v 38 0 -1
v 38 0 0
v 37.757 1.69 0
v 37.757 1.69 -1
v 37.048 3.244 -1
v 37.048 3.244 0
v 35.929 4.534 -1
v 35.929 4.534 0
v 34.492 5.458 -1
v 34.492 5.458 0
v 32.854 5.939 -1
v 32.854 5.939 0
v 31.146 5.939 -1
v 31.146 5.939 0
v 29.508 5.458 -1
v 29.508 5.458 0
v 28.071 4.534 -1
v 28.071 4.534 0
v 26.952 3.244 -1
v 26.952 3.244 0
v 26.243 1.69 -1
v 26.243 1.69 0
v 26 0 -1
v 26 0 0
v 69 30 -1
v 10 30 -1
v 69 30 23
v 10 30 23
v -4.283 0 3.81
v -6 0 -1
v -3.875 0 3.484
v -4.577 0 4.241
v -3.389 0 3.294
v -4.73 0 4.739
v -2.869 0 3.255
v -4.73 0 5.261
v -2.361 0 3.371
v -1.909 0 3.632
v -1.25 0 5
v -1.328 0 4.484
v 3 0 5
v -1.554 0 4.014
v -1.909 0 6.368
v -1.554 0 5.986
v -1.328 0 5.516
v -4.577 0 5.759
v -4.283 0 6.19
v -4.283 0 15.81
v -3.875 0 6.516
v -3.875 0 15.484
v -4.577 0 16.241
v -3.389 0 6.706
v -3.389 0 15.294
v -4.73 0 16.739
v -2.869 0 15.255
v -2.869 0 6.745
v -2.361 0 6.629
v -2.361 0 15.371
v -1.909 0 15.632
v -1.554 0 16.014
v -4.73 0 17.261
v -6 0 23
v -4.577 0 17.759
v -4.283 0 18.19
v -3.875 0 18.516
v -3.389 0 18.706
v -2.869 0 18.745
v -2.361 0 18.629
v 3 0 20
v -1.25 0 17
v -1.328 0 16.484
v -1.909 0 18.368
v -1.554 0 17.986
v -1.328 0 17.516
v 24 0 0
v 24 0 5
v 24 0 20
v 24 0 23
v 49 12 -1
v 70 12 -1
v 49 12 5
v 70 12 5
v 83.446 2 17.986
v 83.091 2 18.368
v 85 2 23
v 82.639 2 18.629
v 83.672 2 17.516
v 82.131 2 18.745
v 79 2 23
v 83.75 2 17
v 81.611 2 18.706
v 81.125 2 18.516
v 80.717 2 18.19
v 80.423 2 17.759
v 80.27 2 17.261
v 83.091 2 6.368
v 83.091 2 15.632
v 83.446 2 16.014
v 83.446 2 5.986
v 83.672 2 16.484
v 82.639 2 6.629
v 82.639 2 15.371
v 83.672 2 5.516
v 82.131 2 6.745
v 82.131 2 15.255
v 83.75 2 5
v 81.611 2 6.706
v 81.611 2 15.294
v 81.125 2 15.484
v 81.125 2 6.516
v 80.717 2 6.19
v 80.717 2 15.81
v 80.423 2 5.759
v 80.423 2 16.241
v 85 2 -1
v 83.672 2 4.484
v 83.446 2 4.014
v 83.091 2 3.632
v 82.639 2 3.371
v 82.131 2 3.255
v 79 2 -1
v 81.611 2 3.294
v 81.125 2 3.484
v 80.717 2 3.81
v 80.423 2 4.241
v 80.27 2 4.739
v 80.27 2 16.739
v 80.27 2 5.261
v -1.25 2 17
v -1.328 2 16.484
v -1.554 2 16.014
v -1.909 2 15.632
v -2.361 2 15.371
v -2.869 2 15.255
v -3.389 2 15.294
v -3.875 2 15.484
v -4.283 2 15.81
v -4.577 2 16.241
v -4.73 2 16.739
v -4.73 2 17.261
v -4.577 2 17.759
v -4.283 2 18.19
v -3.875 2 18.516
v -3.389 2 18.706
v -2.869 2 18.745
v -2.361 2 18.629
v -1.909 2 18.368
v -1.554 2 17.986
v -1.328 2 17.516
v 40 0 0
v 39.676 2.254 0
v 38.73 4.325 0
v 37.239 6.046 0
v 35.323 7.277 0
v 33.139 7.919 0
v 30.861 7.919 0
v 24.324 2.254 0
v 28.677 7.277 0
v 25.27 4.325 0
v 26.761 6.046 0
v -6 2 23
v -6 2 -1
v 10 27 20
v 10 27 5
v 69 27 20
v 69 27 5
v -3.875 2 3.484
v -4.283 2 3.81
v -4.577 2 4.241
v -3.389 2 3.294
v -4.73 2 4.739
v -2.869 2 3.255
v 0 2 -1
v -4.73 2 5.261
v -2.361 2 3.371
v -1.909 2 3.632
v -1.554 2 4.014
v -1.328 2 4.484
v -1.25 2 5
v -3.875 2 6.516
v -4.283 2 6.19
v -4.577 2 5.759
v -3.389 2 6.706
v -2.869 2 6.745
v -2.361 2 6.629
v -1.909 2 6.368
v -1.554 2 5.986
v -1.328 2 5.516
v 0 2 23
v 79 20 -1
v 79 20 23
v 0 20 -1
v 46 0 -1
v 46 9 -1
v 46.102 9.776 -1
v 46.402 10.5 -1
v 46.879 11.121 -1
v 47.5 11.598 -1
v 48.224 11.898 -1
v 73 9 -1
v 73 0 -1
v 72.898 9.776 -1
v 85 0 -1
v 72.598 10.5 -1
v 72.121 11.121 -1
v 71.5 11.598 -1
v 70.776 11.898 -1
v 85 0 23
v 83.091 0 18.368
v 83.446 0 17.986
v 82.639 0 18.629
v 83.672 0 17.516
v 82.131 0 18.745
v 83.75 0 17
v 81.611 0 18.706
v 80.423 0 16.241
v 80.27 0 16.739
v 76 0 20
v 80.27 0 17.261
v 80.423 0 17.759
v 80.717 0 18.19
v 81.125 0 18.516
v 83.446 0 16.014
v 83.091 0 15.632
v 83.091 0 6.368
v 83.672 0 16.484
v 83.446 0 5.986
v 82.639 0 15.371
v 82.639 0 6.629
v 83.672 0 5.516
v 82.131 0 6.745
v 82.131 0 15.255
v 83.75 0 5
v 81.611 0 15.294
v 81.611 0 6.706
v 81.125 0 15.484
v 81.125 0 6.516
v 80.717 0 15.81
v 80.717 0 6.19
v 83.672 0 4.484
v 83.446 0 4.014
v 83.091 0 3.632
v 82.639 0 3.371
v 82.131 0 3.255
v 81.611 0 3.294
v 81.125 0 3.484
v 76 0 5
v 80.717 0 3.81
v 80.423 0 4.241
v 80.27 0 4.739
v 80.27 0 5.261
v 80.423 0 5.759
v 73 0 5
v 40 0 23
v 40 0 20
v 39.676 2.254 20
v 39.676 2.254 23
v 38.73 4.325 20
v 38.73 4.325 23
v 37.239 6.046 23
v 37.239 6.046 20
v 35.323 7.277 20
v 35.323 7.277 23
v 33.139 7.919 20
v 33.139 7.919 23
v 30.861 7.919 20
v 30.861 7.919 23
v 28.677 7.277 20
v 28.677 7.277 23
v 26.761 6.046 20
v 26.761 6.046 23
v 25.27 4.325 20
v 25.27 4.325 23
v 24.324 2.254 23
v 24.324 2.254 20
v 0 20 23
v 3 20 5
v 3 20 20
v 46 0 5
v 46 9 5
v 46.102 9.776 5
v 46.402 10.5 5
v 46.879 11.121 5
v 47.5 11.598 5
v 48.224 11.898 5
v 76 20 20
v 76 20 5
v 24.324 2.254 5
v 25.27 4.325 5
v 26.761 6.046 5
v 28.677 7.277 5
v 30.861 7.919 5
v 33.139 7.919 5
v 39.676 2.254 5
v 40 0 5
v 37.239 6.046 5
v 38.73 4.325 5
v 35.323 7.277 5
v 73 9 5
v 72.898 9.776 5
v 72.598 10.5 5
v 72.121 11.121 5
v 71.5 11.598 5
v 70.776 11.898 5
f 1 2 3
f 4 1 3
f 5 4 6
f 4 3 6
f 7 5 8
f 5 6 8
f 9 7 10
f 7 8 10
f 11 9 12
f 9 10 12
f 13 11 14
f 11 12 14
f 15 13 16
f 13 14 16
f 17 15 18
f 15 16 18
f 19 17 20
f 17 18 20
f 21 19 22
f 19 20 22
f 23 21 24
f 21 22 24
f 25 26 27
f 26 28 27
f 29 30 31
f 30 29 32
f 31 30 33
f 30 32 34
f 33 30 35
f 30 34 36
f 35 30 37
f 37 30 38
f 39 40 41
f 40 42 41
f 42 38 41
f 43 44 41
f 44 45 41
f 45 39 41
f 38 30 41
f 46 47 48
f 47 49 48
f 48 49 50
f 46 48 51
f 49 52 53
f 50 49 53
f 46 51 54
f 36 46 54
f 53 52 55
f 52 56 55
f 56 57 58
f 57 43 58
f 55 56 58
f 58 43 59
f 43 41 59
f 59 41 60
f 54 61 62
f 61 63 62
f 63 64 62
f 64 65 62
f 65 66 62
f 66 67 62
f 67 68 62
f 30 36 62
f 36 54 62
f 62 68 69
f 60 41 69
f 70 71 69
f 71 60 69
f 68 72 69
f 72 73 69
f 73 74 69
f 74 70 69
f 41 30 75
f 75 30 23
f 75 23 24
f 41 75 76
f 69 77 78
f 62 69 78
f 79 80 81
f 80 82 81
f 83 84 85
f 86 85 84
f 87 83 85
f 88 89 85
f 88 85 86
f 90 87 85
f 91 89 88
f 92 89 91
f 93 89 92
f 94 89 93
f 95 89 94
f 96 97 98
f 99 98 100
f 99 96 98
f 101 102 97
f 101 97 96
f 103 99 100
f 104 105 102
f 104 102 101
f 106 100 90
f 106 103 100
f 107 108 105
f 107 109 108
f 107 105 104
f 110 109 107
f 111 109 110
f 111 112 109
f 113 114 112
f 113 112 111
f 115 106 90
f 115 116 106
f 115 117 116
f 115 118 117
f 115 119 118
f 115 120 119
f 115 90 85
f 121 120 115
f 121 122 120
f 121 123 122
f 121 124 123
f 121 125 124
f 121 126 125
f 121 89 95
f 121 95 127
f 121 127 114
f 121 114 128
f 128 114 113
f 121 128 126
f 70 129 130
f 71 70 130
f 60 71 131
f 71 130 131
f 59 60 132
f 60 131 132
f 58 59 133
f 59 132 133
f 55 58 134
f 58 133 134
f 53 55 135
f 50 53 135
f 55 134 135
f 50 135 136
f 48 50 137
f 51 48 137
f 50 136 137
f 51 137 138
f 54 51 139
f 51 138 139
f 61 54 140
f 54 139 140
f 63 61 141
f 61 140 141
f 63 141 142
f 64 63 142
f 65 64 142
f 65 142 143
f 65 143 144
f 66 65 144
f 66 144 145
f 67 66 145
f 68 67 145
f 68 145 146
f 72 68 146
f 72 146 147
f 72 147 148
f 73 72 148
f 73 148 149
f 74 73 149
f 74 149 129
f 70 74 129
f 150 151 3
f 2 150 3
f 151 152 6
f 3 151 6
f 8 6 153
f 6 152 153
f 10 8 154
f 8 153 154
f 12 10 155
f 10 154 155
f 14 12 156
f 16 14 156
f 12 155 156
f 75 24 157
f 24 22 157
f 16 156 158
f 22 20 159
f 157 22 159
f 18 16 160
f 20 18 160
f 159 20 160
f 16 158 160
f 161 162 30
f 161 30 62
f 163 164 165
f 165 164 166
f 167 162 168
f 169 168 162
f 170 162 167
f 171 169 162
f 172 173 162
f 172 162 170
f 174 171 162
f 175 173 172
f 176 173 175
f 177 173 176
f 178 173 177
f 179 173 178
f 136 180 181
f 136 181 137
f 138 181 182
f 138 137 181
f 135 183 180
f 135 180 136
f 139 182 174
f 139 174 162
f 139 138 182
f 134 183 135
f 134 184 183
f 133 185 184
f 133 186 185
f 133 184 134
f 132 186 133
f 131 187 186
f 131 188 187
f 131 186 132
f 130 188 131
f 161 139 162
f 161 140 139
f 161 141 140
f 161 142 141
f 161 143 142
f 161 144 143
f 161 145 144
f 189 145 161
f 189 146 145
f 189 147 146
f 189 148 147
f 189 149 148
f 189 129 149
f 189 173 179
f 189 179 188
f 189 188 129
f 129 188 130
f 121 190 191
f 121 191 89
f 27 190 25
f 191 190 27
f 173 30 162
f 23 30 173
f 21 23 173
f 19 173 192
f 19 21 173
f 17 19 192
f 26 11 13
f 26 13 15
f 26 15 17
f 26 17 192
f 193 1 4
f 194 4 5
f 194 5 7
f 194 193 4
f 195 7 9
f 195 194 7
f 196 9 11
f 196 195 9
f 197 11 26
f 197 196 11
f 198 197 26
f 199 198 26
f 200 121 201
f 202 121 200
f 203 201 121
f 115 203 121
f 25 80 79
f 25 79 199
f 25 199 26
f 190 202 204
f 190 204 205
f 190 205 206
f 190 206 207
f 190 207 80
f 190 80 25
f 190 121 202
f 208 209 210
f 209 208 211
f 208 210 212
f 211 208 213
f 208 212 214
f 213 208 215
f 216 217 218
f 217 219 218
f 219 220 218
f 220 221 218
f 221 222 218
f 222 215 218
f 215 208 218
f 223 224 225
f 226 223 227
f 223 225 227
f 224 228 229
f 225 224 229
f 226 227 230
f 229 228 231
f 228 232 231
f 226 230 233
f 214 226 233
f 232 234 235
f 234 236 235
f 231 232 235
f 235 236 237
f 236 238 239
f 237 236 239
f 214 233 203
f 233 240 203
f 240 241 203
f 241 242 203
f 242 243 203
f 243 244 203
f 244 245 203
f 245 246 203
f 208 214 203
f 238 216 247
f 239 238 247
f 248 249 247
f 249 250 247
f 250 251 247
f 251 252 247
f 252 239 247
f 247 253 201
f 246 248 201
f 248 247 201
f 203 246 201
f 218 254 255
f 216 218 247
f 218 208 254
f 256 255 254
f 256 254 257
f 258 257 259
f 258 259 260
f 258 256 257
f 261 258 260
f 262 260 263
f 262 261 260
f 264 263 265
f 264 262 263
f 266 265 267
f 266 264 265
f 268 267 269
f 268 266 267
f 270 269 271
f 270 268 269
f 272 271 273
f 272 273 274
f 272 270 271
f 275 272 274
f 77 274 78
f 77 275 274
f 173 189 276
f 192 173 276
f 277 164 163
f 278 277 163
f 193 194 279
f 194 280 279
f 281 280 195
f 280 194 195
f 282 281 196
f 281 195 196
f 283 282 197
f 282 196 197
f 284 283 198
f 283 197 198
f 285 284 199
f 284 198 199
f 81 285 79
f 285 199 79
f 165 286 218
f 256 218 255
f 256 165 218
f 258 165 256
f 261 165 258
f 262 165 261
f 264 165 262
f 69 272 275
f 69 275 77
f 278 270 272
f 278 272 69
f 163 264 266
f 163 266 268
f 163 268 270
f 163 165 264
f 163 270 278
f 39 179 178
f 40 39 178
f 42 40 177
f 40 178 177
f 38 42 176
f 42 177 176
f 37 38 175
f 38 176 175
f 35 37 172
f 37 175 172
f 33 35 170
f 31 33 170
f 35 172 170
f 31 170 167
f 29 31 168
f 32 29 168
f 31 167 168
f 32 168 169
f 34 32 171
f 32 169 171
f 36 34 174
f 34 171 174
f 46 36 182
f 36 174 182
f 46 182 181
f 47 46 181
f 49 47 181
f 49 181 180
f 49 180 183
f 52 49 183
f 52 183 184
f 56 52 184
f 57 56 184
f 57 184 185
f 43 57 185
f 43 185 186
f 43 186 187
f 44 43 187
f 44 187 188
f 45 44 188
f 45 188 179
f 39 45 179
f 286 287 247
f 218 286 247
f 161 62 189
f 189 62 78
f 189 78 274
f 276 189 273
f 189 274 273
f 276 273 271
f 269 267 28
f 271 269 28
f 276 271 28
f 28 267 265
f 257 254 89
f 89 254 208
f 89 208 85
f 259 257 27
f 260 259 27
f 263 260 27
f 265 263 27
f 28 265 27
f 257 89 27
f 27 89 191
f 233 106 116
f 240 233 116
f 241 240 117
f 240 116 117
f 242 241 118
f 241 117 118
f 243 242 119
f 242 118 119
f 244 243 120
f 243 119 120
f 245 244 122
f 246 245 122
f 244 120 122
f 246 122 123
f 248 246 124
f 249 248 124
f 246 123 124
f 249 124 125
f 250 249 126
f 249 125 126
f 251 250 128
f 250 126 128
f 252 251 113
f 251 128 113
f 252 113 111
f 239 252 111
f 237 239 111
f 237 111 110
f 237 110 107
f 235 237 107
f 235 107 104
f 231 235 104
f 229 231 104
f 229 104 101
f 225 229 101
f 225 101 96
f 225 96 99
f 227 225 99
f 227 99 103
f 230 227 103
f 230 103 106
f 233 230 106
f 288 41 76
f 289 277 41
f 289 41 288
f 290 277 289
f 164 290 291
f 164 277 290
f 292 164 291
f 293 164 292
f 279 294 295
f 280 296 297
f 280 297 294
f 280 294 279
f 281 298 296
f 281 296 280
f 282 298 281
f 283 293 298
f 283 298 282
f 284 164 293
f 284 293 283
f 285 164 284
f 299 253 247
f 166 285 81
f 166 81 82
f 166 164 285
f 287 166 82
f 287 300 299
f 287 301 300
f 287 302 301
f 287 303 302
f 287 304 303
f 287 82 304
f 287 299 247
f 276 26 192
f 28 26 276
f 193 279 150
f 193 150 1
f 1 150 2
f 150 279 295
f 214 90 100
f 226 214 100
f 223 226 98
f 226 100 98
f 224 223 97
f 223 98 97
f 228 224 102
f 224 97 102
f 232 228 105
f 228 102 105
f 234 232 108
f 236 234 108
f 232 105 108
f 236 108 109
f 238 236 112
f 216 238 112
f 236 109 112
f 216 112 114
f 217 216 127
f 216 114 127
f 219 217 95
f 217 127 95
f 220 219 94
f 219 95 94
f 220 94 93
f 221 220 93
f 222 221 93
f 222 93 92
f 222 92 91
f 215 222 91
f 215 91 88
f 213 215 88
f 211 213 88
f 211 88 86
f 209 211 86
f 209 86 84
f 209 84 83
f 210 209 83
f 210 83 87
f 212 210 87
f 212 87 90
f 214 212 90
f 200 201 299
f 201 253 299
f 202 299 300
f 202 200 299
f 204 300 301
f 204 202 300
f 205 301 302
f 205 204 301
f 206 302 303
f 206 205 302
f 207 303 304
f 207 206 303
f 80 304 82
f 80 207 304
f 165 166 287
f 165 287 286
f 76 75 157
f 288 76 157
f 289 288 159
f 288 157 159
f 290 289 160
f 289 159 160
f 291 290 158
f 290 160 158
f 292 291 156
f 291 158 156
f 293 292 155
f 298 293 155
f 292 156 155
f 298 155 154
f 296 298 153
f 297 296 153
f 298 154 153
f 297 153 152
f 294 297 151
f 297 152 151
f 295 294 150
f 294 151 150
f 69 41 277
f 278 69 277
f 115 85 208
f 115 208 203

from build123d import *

# Parameters (mm, degrees)
SALIENTE_EXTRUIR1_DEPTH    = 5
SALIENTE_EXTRUIR4_DEPTH    = 15
SALIENTE_EXTRUIR6_DEPTH    = 3
SALIENTE_EXTRUIR10_DEPTH   = 1
CROQUIS8_W                 = 24
CROQUIS8_H                 = 2
SALIENTE_EXTRUIR8_DEPTH    = 6
CROQUIS18_W                = 24
CROQUIS18_H                = 2
SALIENTE_EXTRUIR14_DEPTH   = 6
CROQUIS12_R                = 1.75
CORTAR_EXTRUIR1_DEPTH      = 29
CORTAR_EXTRUIR1_DEPTH_BACK = 3
CHAFL_N4_SIZE              = 7
CHAFL_N5_SIZE              = 10
REDONDEO1_R                = 3


with BuildPart() as part:
    # Croquis1 → Saliente-Extruir1 (new body)
    with BuildSketch(Plane.XY):
        with BuildLine():
            Line((0, 0), (24, 0))
            ThreePointArc((24, 0), (32, 8), (40, 0))
            Line((40, 0), (46, 0))
            Line((46, 0), (46, 12))
            Line((46, 12), (73, 12))
            Line((73, 12), (73, 0))
            Line((73, 0), (79, 0))
            Line((79, 0), (79, 30))
            Line((79, 30), (0, 30))
            Line((0, 30), (0, 0))
        make_face()
    extrude(amount=SALIENTE_EXTRUIR1_DEPTH)

    # Croquis4 → Saliente-Extruir4 (add)
    with BuildSketch(Plane.XY.offset(5)):
        Polygon((0, 30), (0, 0), (3, 0), (3, 27), (76, 27), (76, 0), (79, 0), (79, 30), align=None)
    extrude(amount=SALIENTE_EXTRUIR4_DEPTH)

    # Croquis6 → Saliente-Extruir6 (add)
    with BuildSketch(Plane.XY.offset(20)):
        with BuildLine():
            Line((0, 0), (0, 30))
            Line((0, 30), (79, 30))
            Line((79, 30), (79, 0))
            Line((79, 0), (40, 0))
            ThreePointArc((40, 0), (32, 8), (24, 0))
            Line((24, 0), (0, 0))
        make_face()
    extrude(amount=SALIENTE_EXTRUIR6_DEPTH)

    # Croquis13 → Saliente-Extruir10 (add)
    with BuildSketch(Plane(origin=(0, 0, 0), x_dir=(-1, 0, 0), z_dir=(0, 0, -1))):
        with BuildLine():
            Line((-79, 30), (-79, 0))
            Line((-79, 0), (-73, 0))
            Line((-73, 0), (-73, 12))
            Line((-73, 12), (-46, 12))
            Line((-46, 12), (-46, 0))
            Line((-46, 0), (-40, 0))
            Line((-40, 0), (-38, 0))
            ThreePointArc((-38, 0), (-32, 6), (-26, 0))
            Line((-26, 0), (0, 0))
            Line((0, 0), (0, 30))
            Line((0, 30), (-79, 30))
        make_face()
    extrude(amount=SALIENTE_EXTRUIR10_DEPTH)

    # Croquis8 → Saliente-Extruir8 (add)
    with BuildSketch(Plane(origin=(79, 0, 0), x_dir=(0, 0, -1), z_dir=(1, 0, 0))):
        with Locations((-11, 1)):
            Rectangle(CROQUIS8_W, CROQUIS8_H)
    extrude(amount=SALIENTE_EXTRUIR8_DEPTH)

    # Croquis18 → Saliente-Extruir14 (add)
    with BuildSketch(Plane.ZY):
        with Locations((11, 1)):
            Rectangle(CROQUIS18_W, CROQUIS18_H)
    extrude(amount=SALIENTE_EXTRUIR14_DEPTH)

    # Croquis12 → Cortar-Extruir1 (cut, two sides)
    with BuildSketch(Plane(origin=(0, 2, 0), x_dir=(1, 0, 0), z_dir=(0, 1, 0))) as cortar_extruir1_sk:
        with Locations((-3, -5)):
            Circle(CROQUIS12_R)
        with Locations((-3, -17)):
            Circle(CROQUIS12_R)
        with Locations((82, -17)):
            Circle(CROQUIS12_R)
        with Locations((82, -5)):
            Circle(CROQUIS12_R)
    extrude(amount=CORTAR_EXTRUIR1_DEPTH, mode=Mode.SUBTRACT)
    extrude(cortar_extruir1_sk.sketch, amount=-CORTAR_EXTRUIR1_DEPTH_BACK, mode=Mode.SUBTRACT)

    # Chaflán4
    chafl_n4_edges = [part.edges().sort_by_distance(p)[0] for p in [
        (3, 27, 12.5),
        (76, 27, 12.5),
    ]]
    chamfer(chafl_n4_edges, length=CHAFL_N4_SIZE)

    # Chaflán5
    chafl_n5_edges = [part.edges().sort_by_distance(p)[0] for p in [
        (0, 30, 11),
        (79, 30, 11),
    ]]
    chamfer(chafl_n5_edges, length=CHAFL_N5_SIZE)

    # Redondeo1
    redondeo1_edges = [part.edges().sort_by_distance(p)[0] for p in [
        (73, 12, 2),
        (46, 12, 2),
    ]]
    fillet(redondeo1_edges, radius=REDONDEO1_R)


solid = part.part
